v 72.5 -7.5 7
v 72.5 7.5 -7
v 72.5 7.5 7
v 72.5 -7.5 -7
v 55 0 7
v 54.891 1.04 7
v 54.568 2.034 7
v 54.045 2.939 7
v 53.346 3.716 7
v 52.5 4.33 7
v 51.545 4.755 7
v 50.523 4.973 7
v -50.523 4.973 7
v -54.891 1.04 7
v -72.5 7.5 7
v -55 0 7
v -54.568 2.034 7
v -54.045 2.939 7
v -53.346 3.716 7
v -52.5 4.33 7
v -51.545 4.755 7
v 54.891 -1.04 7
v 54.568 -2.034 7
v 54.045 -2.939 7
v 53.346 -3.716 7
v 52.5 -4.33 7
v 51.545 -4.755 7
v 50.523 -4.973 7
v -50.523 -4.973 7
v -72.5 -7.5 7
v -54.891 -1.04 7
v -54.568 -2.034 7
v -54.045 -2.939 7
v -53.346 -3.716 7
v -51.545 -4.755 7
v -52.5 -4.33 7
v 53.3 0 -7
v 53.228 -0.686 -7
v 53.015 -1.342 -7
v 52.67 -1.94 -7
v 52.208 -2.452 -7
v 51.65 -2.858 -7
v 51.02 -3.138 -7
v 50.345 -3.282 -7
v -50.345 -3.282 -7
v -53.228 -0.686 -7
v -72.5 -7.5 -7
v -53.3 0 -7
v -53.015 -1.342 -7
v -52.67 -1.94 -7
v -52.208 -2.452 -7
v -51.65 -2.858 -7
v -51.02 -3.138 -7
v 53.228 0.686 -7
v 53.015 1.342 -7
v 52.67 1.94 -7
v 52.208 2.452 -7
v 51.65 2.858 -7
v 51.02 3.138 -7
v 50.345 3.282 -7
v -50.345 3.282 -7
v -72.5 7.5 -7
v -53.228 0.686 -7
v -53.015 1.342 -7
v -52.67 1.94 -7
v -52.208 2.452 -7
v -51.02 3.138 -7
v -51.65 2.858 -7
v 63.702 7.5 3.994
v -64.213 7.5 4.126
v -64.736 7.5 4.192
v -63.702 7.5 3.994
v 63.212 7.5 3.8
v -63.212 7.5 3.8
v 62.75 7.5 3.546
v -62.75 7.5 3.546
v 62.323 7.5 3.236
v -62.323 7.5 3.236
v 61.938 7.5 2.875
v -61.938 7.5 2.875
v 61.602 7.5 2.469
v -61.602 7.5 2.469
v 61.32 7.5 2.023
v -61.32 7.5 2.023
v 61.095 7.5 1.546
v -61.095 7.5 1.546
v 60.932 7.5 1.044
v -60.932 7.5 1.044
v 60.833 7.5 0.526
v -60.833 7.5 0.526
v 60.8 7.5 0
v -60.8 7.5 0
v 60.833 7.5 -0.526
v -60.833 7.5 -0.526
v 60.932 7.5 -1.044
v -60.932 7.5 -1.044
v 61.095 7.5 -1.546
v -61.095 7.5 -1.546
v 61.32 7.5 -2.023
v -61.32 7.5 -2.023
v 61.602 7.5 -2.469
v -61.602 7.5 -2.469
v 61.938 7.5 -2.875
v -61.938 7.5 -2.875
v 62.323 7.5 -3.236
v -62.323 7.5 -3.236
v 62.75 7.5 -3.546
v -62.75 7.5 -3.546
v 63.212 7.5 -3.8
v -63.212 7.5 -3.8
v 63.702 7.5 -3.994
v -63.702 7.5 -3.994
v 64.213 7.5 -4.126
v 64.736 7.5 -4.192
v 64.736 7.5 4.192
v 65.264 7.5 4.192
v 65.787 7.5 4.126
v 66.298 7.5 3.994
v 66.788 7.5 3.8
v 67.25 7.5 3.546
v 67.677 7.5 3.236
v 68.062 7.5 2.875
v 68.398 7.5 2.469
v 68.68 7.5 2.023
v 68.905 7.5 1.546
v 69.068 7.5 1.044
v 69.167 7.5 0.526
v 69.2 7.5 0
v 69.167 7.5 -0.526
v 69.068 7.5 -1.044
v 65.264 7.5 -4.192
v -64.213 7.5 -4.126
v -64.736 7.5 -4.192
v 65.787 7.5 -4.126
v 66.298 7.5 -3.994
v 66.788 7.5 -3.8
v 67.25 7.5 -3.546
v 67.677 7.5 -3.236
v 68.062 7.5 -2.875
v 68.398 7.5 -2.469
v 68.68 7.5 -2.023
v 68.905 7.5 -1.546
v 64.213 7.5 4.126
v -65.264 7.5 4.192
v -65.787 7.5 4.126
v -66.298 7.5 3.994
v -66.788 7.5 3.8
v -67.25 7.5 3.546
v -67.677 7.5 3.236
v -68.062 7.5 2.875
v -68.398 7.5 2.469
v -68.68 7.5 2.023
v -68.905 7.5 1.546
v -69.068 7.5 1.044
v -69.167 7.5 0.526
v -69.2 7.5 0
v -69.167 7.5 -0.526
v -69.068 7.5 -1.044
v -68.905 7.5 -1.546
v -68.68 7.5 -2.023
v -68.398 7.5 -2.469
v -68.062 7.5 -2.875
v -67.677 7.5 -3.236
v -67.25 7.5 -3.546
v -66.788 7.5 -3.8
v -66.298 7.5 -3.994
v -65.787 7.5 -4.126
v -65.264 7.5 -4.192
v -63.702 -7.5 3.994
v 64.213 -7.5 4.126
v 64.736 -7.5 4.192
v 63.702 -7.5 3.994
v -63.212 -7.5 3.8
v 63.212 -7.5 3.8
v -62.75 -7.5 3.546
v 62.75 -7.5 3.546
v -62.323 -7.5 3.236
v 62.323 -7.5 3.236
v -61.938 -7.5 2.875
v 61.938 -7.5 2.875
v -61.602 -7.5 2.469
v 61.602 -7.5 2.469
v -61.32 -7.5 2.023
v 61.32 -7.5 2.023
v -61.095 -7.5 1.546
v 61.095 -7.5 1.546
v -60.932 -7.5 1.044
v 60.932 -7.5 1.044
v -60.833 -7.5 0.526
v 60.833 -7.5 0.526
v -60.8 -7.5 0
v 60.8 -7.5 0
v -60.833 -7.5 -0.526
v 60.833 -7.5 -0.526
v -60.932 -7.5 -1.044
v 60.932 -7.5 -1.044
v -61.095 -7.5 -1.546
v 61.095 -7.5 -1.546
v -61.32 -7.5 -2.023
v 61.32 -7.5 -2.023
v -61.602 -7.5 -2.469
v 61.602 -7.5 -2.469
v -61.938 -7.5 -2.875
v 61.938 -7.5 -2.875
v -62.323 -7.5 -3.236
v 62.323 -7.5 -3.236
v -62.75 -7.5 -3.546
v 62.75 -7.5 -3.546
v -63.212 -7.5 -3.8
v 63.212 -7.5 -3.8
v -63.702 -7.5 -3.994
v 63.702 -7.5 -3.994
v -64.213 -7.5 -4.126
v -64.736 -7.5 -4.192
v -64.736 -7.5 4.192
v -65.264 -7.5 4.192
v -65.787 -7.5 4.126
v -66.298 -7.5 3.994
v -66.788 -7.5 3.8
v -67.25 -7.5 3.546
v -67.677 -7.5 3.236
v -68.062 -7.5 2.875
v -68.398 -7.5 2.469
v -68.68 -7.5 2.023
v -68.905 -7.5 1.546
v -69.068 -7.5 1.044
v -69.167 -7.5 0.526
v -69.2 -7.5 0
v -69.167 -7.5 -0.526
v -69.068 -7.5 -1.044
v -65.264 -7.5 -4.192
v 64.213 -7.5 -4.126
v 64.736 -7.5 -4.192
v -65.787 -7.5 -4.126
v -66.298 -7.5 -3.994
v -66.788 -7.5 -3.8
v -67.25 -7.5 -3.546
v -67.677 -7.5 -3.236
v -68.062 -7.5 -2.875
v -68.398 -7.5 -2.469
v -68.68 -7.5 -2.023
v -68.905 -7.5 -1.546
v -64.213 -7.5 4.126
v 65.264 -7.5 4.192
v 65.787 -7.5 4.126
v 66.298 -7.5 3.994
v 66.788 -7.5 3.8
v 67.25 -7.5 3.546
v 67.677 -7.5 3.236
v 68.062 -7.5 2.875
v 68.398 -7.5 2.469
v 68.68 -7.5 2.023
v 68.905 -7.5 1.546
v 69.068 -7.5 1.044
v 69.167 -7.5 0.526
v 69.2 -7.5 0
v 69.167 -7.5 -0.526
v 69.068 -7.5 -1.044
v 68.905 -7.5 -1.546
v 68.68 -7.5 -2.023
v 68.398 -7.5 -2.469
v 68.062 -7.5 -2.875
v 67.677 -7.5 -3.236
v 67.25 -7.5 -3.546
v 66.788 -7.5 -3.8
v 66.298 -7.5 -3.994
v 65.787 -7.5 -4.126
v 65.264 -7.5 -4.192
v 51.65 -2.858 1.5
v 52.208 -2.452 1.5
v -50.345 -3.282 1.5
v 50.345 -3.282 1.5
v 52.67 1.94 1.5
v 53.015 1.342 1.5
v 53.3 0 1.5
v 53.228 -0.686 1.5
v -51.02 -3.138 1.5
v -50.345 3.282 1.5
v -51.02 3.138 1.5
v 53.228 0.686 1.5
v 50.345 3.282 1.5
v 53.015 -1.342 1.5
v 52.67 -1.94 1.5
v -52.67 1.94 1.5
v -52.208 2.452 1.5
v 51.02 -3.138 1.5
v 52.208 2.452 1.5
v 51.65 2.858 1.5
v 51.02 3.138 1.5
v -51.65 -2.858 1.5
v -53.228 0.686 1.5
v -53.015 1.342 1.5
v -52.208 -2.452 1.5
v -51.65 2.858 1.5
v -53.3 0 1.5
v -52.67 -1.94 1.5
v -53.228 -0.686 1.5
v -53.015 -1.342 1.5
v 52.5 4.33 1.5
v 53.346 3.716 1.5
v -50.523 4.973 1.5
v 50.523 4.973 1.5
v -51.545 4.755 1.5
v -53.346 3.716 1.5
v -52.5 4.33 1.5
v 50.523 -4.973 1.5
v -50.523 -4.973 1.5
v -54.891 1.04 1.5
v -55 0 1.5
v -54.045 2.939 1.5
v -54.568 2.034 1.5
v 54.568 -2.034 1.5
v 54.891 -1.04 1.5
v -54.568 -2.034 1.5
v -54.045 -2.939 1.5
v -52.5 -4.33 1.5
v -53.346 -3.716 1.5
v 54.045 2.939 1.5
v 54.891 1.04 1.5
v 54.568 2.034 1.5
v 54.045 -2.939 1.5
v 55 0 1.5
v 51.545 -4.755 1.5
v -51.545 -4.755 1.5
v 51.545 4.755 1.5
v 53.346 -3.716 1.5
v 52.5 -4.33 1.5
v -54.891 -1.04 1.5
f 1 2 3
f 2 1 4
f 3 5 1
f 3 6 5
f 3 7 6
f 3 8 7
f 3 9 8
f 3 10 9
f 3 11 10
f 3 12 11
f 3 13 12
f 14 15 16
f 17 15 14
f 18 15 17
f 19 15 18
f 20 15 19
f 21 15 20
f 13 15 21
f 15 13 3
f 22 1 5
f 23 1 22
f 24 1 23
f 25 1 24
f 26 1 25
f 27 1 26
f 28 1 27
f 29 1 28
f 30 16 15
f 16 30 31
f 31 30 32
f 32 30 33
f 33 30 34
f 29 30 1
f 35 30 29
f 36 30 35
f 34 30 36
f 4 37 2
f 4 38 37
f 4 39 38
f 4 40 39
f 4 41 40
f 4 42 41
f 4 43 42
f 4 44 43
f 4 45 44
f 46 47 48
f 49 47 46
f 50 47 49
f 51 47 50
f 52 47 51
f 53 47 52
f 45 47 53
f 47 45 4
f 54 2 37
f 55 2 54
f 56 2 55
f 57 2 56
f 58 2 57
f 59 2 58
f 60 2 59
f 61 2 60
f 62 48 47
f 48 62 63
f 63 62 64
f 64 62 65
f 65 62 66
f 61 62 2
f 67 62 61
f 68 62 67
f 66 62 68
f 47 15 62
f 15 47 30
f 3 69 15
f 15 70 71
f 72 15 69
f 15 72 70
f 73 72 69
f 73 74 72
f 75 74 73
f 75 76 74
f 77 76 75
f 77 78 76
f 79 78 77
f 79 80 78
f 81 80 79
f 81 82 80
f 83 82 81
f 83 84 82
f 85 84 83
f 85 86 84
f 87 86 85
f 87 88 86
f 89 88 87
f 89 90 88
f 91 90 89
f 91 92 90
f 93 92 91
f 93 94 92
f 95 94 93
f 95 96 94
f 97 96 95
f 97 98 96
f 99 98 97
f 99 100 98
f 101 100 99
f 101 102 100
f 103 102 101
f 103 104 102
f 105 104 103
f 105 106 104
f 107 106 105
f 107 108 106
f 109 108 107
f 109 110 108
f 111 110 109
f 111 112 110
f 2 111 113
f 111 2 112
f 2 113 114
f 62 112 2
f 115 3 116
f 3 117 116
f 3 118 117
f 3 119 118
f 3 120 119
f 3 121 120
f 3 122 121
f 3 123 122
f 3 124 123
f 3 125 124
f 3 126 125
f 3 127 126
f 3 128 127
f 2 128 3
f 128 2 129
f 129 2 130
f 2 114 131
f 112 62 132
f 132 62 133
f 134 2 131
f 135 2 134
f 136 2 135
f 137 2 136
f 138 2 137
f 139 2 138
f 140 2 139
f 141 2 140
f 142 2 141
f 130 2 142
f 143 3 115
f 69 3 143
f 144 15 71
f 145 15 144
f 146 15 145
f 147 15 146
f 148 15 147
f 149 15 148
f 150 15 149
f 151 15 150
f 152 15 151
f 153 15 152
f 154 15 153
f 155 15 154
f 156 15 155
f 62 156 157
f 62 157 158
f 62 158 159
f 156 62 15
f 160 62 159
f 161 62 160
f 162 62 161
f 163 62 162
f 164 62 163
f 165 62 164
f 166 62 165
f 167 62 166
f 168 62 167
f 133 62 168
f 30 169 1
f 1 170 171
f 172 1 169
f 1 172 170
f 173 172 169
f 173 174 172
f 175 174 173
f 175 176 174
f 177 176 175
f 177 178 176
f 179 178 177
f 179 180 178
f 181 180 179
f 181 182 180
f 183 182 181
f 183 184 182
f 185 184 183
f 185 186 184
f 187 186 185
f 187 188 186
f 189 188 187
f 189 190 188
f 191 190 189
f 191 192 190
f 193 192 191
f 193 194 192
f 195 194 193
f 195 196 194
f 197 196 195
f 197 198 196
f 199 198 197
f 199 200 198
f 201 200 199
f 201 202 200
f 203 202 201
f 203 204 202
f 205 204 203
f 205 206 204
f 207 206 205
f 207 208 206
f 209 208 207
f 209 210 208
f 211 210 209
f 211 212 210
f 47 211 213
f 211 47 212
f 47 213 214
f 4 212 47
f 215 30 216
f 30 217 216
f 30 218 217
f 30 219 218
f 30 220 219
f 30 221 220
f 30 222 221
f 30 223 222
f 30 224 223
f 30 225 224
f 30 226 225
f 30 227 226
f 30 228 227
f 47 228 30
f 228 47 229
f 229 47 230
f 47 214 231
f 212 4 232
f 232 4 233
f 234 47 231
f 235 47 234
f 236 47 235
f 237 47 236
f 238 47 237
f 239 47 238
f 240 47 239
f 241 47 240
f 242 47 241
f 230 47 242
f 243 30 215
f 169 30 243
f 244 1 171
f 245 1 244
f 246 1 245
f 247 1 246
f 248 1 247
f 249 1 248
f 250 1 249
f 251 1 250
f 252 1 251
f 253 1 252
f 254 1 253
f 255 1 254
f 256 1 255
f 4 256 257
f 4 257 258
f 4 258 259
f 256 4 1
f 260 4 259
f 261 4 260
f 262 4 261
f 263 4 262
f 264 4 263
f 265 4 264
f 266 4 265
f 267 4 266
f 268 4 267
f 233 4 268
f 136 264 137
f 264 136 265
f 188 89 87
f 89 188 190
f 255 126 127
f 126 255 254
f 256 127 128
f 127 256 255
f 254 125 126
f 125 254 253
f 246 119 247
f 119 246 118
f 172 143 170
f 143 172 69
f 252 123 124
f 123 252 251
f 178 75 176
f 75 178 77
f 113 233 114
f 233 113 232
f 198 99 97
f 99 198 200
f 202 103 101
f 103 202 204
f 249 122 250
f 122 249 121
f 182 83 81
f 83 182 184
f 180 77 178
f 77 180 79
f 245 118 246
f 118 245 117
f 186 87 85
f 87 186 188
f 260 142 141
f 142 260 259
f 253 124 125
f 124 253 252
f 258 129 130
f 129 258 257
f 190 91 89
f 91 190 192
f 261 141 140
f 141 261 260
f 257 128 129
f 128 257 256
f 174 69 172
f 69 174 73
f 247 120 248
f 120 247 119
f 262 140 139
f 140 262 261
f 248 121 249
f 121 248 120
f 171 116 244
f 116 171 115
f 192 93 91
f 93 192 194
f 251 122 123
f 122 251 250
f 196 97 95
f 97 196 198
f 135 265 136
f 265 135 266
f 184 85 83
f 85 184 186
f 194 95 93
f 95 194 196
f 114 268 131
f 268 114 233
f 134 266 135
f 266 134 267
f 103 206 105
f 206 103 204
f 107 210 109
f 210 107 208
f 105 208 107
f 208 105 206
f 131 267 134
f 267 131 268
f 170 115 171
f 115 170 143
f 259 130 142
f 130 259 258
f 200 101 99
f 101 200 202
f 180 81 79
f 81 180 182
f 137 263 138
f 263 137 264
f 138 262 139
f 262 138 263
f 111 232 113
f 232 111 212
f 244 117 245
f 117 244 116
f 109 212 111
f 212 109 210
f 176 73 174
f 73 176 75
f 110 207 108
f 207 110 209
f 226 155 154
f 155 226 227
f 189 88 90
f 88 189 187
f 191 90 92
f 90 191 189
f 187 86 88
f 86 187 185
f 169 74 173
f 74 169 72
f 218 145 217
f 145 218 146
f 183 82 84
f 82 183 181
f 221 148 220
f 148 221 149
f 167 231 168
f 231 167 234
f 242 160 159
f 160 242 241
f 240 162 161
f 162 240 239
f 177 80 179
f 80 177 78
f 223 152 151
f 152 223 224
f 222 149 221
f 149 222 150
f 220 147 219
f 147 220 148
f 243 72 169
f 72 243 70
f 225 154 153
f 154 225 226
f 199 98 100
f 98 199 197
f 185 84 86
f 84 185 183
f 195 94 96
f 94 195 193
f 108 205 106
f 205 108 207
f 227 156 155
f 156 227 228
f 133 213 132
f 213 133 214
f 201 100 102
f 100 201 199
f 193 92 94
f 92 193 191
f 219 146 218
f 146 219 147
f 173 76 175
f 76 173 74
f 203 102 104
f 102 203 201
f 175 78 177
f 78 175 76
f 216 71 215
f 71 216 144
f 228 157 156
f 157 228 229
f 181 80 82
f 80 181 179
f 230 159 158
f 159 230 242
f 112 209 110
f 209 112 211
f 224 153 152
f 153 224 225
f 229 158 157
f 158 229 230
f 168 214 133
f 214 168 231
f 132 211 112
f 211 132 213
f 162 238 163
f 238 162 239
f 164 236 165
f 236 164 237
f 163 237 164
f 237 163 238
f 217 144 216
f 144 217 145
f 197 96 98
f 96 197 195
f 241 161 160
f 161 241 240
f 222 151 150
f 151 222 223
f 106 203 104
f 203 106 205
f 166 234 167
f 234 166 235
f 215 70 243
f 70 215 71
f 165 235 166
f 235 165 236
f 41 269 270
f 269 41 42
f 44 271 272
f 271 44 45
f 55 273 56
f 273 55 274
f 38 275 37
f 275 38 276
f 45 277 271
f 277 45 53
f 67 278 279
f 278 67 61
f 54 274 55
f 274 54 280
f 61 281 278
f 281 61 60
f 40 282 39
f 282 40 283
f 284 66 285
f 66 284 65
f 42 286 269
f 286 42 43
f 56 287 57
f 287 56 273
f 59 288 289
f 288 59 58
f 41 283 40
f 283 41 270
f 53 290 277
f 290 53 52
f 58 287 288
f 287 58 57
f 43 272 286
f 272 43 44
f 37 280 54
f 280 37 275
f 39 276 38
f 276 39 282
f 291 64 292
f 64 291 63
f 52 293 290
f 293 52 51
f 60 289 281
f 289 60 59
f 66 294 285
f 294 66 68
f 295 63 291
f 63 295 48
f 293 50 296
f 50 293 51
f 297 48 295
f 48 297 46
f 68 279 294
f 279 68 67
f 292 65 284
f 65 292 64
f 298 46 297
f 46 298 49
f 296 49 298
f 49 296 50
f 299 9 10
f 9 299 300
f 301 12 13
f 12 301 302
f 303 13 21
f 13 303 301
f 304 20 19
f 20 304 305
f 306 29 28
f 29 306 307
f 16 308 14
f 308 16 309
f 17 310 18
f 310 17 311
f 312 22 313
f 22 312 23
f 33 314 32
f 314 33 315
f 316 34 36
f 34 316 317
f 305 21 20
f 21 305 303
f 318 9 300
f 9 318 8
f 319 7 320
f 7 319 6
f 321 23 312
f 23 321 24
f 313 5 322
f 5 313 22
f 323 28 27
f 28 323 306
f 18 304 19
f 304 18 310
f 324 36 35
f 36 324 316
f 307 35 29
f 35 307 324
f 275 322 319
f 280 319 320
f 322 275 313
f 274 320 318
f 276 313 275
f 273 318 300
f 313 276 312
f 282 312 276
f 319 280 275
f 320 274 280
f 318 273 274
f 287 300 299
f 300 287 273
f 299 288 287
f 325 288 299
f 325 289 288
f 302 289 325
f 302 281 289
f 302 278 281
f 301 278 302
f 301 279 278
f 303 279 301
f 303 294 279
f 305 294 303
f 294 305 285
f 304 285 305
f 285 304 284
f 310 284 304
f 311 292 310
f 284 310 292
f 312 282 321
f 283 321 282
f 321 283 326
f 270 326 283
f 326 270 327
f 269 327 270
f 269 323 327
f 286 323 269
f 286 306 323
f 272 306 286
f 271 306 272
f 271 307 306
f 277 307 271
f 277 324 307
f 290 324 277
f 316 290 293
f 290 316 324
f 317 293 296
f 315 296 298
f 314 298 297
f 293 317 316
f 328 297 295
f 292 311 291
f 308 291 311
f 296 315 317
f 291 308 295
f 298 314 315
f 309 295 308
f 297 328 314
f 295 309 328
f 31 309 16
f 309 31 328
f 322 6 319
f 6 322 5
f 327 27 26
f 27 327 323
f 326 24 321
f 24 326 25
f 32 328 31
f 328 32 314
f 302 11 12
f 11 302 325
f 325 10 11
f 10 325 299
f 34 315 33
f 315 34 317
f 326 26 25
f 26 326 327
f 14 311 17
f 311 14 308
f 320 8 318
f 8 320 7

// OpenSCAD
// camera dolly

difference(){
    cube([145, 15, 14], center=true);
    
    // axles
    translate([65,0,0])
    rotate([90,0,0])
    cylinder(r=4.2, h=100, $fn=50, center=true);
    
    translate([-65,0,0])
    rotate([90,0,0])
    cylinder(r=4.2, h=100, $fn=50, center=true);    
    
    // camera screw
    hull(){
        translate([-50,0,0])
        cylinder(r=3.3, h=30, $fn=30, center=true);
        translate([50,0,0])
        cylinder(r=3.3, h=30, $fn=30, center=true);        
    }
    
    // camera screw head
    hull(){
        translate([-50,0,5])
        cylinder(r=5, h=7, $fn=30, center=true);
        translate([50,0,5])
        cylinder(r=5, h=7, $fn=30, center=true);        
    }    
}
